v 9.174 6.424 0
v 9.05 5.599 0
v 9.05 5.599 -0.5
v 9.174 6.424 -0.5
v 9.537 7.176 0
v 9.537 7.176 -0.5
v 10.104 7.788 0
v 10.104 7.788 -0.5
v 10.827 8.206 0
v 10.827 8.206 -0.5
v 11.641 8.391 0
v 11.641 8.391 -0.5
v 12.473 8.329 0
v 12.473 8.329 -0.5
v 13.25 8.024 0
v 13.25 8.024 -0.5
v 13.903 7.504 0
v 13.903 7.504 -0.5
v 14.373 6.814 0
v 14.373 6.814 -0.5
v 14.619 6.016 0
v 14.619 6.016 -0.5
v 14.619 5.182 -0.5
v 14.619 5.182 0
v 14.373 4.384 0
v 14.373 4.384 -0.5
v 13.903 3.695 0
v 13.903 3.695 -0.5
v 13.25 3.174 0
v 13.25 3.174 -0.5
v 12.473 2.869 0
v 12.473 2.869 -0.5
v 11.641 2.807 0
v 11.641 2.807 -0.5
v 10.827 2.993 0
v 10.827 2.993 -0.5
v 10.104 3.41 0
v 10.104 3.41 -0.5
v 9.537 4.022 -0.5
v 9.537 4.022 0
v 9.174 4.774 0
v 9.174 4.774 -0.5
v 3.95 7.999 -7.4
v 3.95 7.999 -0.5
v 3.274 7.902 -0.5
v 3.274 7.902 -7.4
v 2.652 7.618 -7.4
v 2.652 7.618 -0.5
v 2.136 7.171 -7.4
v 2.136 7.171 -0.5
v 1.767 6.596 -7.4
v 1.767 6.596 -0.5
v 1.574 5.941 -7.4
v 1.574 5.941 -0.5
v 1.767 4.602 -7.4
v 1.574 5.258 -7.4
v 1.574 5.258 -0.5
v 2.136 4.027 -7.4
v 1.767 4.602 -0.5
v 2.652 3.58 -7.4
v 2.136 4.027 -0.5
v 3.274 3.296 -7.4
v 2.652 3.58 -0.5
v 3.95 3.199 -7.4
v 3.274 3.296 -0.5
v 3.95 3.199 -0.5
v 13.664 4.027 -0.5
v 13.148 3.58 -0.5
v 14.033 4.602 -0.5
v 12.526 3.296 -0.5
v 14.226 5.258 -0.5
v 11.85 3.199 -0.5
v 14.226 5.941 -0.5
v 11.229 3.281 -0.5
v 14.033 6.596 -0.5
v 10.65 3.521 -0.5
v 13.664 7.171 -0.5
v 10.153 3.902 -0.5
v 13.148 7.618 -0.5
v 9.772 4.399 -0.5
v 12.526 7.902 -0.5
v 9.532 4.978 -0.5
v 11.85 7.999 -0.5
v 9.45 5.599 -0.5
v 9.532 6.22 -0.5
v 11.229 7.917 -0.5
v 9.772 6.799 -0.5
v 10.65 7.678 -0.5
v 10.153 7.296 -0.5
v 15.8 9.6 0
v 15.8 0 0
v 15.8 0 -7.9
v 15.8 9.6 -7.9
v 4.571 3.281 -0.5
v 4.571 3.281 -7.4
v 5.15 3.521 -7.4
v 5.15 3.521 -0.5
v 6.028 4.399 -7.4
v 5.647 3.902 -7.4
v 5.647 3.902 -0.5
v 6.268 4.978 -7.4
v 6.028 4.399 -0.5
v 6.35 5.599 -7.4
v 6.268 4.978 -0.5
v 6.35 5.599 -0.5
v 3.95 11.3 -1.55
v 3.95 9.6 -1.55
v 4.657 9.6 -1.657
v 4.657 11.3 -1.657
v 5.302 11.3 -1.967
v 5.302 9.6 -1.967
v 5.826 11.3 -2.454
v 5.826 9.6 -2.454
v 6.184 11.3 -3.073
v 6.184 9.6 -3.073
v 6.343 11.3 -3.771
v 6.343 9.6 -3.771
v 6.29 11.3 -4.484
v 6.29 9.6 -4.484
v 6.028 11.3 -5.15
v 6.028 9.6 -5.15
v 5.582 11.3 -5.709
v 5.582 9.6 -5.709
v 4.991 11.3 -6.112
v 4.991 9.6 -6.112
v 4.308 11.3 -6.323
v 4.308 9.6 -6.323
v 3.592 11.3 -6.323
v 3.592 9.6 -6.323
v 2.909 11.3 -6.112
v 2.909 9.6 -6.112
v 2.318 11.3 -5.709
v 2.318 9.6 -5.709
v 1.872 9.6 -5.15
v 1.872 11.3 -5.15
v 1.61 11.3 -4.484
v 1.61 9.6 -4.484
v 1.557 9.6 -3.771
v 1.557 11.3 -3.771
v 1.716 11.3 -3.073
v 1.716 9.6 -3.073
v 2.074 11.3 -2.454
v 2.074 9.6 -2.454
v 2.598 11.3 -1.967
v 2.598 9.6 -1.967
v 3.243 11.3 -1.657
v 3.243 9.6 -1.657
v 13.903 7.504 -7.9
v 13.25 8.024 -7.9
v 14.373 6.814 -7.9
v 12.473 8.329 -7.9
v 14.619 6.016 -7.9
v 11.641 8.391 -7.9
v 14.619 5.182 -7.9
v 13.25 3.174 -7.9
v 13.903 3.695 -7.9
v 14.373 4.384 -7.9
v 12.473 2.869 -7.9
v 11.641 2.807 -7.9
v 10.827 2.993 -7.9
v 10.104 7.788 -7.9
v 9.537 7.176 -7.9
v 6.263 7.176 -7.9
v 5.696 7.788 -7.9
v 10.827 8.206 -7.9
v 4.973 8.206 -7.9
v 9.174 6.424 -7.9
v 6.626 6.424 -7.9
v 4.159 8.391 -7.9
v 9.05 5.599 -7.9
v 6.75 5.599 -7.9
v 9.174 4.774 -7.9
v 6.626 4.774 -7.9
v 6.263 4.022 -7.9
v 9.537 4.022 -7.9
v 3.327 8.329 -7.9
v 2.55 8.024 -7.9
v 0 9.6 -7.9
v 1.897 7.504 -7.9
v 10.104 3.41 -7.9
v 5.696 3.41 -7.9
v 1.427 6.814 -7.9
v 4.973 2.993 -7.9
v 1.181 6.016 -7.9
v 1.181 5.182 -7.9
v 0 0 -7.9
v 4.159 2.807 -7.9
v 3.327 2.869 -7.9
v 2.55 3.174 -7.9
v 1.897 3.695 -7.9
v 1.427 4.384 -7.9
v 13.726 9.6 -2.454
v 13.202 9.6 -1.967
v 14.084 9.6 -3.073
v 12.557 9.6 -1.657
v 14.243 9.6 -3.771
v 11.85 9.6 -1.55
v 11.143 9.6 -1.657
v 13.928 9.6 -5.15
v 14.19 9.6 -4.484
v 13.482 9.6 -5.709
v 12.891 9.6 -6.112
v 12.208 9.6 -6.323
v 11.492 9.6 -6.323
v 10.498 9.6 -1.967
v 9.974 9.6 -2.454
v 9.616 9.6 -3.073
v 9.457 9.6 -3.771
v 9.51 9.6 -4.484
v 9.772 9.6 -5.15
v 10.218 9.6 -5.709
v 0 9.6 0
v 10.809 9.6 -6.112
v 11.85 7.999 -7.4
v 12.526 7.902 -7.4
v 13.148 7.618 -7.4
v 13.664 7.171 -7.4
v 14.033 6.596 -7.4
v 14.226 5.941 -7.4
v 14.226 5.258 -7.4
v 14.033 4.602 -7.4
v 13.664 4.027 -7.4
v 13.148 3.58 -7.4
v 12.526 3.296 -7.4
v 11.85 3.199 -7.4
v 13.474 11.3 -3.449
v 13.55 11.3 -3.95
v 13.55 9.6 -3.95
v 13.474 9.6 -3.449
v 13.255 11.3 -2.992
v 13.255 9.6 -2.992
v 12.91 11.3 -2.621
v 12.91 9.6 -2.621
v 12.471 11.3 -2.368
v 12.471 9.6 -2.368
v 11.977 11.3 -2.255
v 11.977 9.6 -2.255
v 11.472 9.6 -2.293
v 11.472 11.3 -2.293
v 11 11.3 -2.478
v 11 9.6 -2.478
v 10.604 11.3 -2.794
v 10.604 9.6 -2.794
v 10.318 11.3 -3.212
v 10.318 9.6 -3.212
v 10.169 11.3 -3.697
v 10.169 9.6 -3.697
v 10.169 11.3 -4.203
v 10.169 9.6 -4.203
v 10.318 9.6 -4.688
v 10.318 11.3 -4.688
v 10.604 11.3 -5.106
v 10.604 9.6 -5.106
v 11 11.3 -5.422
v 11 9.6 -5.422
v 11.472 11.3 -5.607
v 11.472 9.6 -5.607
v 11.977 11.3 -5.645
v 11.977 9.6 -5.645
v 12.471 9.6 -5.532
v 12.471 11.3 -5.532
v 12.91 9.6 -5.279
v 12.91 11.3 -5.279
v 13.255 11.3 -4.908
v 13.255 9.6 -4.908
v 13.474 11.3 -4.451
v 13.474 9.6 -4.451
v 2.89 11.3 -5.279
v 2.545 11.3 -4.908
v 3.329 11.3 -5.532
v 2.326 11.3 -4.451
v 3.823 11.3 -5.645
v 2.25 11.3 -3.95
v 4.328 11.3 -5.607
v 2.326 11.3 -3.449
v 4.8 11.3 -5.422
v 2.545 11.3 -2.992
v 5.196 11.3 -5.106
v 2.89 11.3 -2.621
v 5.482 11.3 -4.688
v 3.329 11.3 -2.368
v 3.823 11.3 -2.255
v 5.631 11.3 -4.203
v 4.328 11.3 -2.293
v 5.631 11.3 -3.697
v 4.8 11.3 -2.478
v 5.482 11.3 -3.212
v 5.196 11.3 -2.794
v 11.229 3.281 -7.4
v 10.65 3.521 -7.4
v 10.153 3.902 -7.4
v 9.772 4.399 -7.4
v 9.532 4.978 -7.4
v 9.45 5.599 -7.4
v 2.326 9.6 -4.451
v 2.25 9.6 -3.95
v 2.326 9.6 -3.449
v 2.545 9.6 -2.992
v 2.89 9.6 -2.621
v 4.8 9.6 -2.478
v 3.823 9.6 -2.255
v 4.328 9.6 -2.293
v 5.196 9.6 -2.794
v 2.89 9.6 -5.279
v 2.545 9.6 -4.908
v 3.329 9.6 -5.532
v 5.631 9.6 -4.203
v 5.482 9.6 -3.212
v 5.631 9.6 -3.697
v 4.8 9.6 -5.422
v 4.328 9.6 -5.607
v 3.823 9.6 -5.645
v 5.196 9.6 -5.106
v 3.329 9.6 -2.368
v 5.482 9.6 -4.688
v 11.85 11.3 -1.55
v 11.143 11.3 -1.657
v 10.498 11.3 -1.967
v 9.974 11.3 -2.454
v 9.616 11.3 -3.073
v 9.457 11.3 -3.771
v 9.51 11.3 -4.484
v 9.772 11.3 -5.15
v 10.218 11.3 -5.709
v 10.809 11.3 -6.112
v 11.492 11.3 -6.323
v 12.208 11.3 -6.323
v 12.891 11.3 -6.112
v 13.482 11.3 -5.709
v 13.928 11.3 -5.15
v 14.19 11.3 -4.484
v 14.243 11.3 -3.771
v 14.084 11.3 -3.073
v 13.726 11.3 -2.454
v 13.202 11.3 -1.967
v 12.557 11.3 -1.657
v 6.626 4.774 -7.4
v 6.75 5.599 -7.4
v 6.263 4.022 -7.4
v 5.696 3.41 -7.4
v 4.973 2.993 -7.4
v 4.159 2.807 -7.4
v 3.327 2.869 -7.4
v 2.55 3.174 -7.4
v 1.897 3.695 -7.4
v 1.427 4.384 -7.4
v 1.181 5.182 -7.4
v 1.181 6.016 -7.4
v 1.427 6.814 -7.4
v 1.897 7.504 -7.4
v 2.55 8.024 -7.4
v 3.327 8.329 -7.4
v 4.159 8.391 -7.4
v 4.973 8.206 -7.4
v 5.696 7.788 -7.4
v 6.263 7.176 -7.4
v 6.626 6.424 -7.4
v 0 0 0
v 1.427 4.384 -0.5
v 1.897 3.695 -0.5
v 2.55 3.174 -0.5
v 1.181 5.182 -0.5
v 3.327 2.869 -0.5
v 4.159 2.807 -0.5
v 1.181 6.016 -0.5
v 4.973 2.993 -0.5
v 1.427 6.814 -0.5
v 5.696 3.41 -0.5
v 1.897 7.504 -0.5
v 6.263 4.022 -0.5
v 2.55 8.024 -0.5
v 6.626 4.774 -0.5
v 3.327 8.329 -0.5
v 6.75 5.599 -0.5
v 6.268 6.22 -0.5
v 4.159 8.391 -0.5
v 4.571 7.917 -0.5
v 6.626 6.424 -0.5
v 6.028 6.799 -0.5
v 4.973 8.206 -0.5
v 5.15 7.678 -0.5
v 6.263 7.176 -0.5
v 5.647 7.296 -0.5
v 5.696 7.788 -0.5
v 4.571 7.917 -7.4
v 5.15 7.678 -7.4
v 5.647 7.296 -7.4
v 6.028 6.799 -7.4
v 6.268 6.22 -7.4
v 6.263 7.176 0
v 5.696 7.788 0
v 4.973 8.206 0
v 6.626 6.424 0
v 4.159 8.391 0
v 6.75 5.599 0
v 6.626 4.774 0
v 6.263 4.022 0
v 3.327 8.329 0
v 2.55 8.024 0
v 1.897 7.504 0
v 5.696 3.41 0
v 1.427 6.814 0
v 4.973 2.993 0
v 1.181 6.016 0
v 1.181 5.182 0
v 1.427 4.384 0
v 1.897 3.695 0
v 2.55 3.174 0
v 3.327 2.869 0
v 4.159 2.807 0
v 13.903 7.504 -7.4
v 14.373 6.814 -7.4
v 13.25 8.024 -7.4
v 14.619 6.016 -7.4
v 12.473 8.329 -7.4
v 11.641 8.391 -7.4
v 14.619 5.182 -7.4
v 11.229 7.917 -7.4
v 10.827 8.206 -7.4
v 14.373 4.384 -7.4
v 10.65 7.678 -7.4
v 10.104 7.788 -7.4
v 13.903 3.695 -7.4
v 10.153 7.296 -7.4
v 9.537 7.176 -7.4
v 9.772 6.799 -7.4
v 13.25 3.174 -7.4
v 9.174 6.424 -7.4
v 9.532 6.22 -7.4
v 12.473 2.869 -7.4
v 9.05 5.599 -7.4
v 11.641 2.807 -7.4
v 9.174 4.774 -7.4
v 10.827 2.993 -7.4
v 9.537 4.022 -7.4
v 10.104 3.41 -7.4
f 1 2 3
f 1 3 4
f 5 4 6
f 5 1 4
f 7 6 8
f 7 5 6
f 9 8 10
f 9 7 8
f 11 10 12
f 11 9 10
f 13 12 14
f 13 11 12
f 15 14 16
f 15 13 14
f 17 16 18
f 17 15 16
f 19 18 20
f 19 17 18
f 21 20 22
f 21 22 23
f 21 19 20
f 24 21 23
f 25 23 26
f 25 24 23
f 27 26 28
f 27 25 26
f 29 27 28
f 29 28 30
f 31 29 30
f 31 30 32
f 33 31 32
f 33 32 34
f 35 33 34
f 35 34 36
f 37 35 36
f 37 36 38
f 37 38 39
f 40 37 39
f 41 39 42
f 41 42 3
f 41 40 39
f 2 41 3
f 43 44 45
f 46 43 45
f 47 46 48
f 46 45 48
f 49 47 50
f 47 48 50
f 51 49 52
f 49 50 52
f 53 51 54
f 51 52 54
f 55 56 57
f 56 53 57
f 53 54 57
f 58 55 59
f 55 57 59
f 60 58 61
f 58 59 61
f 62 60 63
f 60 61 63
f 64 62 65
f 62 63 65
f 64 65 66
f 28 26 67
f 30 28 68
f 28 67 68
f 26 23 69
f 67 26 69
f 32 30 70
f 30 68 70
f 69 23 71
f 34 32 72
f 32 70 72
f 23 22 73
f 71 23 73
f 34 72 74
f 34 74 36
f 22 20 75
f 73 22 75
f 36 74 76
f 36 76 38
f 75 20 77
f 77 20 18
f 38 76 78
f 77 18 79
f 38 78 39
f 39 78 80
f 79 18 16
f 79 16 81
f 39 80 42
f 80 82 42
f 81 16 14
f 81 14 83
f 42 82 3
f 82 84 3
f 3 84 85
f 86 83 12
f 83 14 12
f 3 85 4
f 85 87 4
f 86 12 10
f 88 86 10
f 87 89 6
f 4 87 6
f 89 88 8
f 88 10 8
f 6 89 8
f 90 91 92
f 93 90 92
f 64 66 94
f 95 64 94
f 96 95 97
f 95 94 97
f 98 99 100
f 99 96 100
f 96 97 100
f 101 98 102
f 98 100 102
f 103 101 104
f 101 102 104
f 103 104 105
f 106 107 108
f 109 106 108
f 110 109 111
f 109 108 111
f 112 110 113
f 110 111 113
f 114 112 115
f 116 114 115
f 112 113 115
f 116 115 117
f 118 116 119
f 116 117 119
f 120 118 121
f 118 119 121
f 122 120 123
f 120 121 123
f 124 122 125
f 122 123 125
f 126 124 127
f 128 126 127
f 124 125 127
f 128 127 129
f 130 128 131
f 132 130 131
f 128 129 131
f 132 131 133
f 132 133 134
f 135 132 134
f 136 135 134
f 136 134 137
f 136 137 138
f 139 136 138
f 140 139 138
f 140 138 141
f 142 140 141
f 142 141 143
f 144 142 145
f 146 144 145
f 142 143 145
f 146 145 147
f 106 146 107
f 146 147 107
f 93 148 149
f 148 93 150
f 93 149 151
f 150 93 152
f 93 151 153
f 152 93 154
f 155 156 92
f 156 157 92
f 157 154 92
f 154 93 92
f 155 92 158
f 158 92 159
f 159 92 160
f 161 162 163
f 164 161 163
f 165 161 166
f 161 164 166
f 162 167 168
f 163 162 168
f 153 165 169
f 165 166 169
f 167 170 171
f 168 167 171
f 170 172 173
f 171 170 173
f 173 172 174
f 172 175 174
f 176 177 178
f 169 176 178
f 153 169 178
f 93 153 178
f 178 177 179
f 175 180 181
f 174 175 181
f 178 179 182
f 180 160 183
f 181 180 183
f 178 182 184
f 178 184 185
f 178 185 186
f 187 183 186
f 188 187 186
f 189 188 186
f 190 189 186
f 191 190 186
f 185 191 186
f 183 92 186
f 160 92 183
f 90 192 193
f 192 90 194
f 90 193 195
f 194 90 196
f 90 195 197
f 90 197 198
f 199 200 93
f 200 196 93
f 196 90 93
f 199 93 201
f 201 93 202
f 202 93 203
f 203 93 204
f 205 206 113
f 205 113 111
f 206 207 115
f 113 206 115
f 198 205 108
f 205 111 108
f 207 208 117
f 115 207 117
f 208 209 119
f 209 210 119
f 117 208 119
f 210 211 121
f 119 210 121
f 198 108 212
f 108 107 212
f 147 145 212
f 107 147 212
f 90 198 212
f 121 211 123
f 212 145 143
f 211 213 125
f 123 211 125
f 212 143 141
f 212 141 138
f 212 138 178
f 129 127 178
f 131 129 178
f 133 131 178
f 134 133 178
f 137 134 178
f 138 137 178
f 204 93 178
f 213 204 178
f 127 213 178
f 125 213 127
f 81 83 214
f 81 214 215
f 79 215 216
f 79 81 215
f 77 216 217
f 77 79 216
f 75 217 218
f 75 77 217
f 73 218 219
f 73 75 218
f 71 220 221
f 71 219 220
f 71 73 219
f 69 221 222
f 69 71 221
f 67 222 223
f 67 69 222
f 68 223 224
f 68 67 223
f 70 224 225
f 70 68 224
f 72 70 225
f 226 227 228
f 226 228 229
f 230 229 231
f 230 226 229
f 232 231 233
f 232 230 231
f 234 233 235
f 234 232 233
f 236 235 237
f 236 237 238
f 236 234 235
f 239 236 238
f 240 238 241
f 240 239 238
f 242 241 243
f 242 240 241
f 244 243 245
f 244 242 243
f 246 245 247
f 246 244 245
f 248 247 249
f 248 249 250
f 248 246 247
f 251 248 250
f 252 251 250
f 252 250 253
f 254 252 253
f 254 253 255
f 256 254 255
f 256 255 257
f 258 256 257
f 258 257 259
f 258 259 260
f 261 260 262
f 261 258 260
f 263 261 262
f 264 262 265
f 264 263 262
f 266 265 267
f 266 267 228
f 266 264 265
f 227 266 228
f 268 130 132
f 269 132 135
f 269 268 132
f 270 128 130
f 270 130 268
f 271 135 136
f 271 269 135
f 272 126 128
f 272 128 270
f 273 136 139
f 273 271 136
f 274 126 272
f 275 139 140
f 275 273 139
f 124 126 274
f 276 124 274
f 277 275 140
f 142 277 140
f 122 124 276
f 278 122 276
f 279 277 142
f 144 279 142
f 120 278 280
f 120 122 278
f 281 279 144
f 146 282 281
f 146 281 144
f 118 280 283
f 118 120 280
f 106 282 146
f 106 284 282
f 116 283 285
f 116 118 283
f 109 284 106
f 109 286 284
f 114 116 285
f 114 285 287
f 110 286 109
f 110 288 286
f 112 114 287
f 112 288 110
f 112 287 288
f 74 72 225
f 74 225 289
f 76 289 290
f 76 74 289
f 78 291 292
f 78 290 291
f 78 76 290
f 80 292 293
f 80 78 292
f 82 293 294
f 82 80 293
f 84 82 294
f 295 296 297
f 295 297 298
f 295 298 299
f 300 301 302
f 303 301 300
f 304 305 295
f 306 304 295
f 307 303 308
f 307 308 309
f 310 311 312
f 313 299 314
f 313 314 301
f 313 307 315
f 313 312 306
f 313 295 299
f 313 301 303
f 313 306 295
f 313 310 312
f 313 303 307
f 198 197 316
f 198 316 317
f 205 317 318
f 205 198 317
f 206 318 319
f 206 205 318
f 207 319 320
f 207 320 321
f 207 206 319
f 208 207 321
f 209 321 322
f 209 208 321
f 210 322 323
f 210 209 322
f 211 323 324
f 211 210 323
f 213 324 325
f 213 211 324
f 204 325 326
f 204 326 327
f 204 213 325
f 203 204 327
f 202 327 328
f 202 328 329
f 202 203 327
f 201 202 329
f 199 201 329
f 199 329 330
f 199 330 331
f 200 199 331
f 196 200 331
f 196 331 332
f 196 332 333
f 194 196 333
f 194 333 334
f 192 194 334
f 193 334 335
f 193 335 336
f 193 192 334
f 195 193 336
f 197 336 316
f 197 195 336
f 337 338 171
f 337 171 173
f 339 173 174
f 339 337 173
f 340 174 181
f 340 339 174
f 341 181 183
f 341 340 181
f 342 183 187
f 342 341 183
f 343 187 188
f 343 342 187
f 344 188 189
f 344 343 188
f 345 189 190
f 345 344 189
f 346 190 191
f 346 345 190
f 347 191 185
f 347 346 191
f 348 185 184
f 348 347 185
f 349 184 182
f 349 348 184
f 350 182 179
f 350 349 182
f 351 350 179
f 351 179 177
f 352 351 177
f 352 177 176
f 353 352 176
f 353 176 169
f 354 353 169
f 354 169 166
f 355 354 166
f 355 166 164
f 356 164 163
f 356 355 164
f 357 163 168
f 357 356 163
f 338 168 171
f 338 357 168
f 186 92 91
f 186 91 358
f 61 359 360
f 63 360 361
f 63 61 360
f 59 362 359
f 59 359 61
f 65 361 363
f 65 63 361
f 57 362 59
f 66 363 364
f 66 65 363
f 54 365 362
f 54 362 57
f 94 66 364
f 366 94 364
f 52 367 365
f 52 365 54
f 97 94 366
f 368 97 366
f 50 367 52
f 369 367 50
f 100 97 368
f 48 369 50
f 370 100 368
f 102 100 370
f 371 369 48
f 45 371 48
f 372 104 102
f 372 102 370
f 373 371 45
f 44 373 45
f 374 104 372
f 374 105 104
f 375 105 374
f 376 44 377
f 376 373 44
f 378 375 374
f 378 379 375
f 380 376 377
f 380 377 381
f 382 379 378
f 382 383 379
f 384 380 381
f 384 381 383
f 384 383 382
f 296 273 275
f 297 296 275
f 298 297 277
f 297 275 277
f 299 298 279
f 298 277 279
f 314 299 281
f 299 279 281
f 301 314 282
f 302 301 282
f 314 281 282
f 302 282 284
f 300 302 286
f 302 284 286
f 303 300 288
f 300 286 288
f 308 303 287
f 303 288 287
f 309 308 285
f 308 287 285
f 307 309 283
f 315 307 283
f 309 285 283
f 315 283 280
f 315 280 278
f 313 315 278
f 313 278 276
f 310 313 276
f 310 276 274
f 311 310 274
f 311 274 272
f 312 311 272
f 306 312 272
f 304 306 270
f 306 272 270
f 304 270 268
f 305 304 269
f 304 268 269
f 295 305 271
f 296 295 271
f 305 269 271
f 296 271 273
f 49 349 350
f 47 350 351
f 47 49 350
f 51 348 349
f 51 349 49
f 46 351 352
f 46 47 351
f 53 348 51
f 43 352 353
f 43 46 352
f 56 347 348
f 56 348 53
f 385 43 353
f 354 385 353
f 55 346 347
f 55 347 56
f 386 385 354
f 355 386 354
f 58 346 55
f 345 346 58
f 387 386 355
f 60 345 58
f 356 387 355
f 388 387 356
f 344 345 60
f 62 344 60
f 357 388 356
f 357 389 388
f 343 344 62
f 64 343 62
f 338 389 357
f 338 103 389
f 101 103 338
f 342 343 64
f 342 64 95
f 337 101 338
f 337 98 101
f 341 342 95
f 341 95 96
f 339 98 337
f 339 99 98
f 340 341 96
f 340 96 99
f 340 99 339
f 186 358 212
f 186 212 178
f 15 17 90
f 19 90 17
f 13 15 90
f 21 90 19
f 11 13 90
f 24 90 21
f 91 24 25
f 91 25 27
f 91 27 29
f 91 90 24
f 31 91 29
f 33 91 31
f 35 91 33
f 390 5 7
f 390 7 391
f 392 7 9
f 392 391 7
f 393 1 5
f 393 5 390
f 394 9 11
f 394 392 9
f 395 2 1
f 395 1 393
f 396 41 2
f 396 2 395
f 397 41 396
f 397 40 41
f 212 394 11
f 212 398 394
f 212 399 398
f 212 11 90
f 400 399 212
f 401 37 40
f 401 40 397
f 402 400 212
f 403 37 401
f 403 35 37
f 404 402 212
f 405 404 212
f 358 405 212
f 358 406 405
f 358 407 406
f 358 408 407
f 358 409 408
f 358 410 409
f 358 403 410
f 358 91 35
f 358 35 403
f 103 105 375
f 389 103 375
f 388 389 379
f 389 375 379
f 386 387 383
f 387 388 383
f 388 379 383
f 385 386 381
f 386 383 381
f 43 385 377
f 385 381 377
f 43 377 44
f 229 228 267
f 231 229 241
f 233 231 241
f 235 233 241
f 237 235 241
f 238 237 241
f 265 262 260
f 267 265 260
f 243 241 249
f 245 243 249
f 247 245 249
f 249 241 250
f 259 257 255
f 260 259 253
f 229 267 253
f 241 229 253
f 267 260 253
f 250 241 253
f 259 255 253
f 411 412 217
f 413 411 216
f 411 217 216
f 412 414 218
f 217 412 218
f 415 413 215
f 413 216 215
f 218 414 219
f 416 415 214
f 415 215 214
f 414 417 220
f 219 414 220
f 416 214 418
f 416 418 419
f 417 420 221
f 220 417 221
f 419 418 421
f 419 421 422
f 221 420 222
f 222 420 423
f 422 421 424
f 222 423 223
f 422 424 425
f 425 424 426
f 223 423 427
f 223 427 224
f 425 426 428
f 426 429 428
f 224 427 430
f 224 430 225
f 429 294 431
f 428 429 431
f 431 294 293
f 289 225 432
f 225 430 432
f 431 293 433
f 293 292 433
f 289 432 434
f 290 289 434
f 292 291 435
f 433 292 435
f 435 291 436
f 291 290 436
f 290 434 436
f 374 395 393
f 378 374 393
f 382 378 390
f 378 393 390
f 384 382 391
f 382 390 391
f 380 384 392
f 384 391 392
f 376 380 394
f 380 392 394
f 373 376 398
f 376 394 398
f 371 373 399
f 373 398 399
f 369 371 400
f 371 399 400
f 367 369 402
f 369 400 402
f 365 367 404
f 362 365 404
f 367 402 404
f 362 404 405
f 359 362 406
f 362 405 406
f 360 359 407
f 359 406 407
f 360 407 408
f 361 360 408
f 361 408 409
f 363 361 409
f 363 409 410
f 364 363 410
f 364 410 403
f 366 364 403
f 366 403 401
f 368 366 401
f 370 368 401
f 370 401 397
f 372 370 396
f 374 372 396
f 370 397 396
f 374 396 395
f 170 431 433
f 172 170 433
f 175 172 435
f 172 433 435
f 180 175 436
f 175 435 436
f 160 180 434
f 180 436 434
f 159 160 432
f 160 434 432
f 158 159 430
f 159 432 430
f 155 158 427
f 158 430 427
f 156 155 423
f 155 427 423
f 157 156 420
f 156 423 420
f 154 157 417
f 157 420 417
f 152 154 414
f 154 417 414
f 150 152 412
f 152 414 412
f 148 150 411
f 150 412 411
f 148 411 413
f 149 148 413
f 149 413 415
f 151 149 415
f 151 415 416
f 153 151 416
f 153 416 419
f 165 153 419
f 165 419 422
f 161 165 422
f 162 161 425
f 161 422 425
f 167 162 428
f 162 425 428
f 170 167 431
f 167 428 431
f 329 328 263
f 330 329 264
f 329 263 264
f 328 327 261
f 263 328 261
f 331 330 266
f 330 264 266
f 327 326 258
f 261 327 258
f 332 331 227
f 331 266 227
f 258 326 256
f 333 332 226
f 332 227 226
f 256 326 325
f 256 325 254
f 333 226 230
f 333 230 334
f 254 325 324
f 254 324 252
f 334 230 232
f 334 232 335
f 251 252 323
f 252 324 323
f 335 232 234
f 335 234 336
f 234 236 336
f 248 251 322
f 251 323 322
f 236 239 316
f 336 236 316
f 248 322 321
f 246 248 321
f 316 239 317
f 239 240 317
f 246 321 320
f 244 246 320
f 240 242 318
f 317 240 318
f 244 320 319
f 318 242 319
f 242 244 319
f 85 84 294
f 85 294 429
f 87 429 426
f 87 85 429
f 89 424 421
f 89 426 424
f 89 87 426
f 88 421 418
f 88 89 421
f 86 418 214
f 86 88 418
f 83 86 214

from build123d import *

# Parameters (mm, degrees)
SKETCH1_W           = 7.9
SKETCH1_H           = 7.9
BOSS_EXTRUDE1_DEPTH = 9.6
CUT_EXTRUDE1_DEPTH  = 9.6
SKETCH3_R           = 2.8
CUT_EXTRUDE2_DEPTH  = 0.5
CUT_EXTRUDE3_START  = -0.5
SKETCH4_R           = 2.8
SKETCH4_R_2         = 2.4
CUT_EXTRUDE3_DEPTH  = 0.5
SKETCH5_R           = 2.4
BOSS_EXTRUDE2_DEPTH = 1.7
CUT_EXTRUDE4_DEPTH  = 1.7


with BuildPart() as part:
    # Sketch1 → Boss-Extrude1 (new body)
    with BuildSketch(Plane(origin=(0, 0, 0), x_dir=(1, 0, 0), z_dir=(0, 1, 0))):
        with Locations((3.95, 3.95)):
            Rectangle(SKETCH1_W, SKETCH1_H)
    extrude(amount=BOSS_EXTRUDE1_DEPTH)

    # Sketch2 → Cut-Extrude1 (cut)
    with BuildSketch(Plane.XY):
        with BuildLine():
            ThreePointArc((3.95, 7.999162379), (1.55, 5.599162379), (3.95, 3.199162379))
            Line((3.95, 3.199162379), (3.95, 3.2))
            Line((3.95, 3.2), (3.95, 7.998324758))
            Line((3.95, 7.998324758), (3.95, 7.999162379))
        make_face()
        with BuildLine():
            Line((3.95, 3.2), (3.95, 3.199162379))
            ThreePointArc((3.95, 3.199162379), (5.647056275, 3.902106104), (6.35, 5.599162379))
            ThreePointArc((6.35, 5.599162379), (5.647056275, 7.296218654), (3.95, 7.999162379))
            Line((3.95, 7.999162379), (3.95, 7.998324758))
            Line((3.95, 7.998324758), (3.95, 3.2))
        make_face()
    extrude(amount=-CUT_EXTRUDE1_DEPTH, mode=Mode.SUBTRACT)

    # Sketch3 → Cut-Extrude2 (cut)
    with BuildSketch(Plane.XY):
        with Locations((3.95, 5.599162379)):
            Circle(SKETCH3_R)
    extrude(amount=-CUT_EXTRUDE2_DEPTH, mode=Mode.SUBTRACT)

    # Sketch4 → Cut-Extrude3 (cut)
    with BuildSketch(Plane(origin=(0, 0, -7.9), x_dir=(-1, 0, 0), z_dir=(0, 0, -1)).offset(CUT_EXTRUDE3_START)):
        with Locations(Location((-3.95, 5.599162379, 0), (0, 0, 180))):
            Circle(SKETCH4_R)
        with Locations(Location((-3.95, 5.599162379, 0), (0, 0, 180))):
            Circle(SKETCH4_R_2, mode=Mode.SUBTRACT)
    extrude(amount=CUT_EXTRUDE3_DEPTH, mode=Mode.SUBTRACT)

    # Sketch5 → Boss-Extrude2 (add)
    with BuildSketch(Plane(origin=(0, 9.6, 0), x_dir=(1, 0, 0), z_dir=(0, 1, 0))):
        with Locations(Location((3.95, 3.95, 0), (0, 0, 270))):
            Circle(SKETCH5_R)
    extrude(amount=BOSS_EXTRUDE2_DEPTH)

    # Sketch6 → Cut-Extrude4 (cut)
    with BuildSketch(Plane(origin=(0, 11.3, 0), x_dir=(1, 0, 0), z_dir=(0, 1, 0))):
        with BuildLine():
            ThreePointArc((5.65, 3.95), (3.95, 5.65), (2.25, 3.95))
            Line((2.25, 3.95), (5.65, 3.95))
        make_face()
        with BuildLine():
            Line((5.65, 3.95), (2.25, 3.95))
            ThreePointArc((2.25, 3.95), (3.95, 2.25), (5.65, 3.95))
        make_face()
    extrude(amount=-CUT_EXTRUDE4_DEPTH, mode=Mode.SUBTRACT)

    # Mirror1: part across plane


with BuildPart() as part_1:
    add(part.part)
    add(part.part.mirror(Plane(origin=(7.9, 9.6, 0), x_dir=(0, 0, 1), z_dir=(-1, 0, 0))))


solid = part_1.part
